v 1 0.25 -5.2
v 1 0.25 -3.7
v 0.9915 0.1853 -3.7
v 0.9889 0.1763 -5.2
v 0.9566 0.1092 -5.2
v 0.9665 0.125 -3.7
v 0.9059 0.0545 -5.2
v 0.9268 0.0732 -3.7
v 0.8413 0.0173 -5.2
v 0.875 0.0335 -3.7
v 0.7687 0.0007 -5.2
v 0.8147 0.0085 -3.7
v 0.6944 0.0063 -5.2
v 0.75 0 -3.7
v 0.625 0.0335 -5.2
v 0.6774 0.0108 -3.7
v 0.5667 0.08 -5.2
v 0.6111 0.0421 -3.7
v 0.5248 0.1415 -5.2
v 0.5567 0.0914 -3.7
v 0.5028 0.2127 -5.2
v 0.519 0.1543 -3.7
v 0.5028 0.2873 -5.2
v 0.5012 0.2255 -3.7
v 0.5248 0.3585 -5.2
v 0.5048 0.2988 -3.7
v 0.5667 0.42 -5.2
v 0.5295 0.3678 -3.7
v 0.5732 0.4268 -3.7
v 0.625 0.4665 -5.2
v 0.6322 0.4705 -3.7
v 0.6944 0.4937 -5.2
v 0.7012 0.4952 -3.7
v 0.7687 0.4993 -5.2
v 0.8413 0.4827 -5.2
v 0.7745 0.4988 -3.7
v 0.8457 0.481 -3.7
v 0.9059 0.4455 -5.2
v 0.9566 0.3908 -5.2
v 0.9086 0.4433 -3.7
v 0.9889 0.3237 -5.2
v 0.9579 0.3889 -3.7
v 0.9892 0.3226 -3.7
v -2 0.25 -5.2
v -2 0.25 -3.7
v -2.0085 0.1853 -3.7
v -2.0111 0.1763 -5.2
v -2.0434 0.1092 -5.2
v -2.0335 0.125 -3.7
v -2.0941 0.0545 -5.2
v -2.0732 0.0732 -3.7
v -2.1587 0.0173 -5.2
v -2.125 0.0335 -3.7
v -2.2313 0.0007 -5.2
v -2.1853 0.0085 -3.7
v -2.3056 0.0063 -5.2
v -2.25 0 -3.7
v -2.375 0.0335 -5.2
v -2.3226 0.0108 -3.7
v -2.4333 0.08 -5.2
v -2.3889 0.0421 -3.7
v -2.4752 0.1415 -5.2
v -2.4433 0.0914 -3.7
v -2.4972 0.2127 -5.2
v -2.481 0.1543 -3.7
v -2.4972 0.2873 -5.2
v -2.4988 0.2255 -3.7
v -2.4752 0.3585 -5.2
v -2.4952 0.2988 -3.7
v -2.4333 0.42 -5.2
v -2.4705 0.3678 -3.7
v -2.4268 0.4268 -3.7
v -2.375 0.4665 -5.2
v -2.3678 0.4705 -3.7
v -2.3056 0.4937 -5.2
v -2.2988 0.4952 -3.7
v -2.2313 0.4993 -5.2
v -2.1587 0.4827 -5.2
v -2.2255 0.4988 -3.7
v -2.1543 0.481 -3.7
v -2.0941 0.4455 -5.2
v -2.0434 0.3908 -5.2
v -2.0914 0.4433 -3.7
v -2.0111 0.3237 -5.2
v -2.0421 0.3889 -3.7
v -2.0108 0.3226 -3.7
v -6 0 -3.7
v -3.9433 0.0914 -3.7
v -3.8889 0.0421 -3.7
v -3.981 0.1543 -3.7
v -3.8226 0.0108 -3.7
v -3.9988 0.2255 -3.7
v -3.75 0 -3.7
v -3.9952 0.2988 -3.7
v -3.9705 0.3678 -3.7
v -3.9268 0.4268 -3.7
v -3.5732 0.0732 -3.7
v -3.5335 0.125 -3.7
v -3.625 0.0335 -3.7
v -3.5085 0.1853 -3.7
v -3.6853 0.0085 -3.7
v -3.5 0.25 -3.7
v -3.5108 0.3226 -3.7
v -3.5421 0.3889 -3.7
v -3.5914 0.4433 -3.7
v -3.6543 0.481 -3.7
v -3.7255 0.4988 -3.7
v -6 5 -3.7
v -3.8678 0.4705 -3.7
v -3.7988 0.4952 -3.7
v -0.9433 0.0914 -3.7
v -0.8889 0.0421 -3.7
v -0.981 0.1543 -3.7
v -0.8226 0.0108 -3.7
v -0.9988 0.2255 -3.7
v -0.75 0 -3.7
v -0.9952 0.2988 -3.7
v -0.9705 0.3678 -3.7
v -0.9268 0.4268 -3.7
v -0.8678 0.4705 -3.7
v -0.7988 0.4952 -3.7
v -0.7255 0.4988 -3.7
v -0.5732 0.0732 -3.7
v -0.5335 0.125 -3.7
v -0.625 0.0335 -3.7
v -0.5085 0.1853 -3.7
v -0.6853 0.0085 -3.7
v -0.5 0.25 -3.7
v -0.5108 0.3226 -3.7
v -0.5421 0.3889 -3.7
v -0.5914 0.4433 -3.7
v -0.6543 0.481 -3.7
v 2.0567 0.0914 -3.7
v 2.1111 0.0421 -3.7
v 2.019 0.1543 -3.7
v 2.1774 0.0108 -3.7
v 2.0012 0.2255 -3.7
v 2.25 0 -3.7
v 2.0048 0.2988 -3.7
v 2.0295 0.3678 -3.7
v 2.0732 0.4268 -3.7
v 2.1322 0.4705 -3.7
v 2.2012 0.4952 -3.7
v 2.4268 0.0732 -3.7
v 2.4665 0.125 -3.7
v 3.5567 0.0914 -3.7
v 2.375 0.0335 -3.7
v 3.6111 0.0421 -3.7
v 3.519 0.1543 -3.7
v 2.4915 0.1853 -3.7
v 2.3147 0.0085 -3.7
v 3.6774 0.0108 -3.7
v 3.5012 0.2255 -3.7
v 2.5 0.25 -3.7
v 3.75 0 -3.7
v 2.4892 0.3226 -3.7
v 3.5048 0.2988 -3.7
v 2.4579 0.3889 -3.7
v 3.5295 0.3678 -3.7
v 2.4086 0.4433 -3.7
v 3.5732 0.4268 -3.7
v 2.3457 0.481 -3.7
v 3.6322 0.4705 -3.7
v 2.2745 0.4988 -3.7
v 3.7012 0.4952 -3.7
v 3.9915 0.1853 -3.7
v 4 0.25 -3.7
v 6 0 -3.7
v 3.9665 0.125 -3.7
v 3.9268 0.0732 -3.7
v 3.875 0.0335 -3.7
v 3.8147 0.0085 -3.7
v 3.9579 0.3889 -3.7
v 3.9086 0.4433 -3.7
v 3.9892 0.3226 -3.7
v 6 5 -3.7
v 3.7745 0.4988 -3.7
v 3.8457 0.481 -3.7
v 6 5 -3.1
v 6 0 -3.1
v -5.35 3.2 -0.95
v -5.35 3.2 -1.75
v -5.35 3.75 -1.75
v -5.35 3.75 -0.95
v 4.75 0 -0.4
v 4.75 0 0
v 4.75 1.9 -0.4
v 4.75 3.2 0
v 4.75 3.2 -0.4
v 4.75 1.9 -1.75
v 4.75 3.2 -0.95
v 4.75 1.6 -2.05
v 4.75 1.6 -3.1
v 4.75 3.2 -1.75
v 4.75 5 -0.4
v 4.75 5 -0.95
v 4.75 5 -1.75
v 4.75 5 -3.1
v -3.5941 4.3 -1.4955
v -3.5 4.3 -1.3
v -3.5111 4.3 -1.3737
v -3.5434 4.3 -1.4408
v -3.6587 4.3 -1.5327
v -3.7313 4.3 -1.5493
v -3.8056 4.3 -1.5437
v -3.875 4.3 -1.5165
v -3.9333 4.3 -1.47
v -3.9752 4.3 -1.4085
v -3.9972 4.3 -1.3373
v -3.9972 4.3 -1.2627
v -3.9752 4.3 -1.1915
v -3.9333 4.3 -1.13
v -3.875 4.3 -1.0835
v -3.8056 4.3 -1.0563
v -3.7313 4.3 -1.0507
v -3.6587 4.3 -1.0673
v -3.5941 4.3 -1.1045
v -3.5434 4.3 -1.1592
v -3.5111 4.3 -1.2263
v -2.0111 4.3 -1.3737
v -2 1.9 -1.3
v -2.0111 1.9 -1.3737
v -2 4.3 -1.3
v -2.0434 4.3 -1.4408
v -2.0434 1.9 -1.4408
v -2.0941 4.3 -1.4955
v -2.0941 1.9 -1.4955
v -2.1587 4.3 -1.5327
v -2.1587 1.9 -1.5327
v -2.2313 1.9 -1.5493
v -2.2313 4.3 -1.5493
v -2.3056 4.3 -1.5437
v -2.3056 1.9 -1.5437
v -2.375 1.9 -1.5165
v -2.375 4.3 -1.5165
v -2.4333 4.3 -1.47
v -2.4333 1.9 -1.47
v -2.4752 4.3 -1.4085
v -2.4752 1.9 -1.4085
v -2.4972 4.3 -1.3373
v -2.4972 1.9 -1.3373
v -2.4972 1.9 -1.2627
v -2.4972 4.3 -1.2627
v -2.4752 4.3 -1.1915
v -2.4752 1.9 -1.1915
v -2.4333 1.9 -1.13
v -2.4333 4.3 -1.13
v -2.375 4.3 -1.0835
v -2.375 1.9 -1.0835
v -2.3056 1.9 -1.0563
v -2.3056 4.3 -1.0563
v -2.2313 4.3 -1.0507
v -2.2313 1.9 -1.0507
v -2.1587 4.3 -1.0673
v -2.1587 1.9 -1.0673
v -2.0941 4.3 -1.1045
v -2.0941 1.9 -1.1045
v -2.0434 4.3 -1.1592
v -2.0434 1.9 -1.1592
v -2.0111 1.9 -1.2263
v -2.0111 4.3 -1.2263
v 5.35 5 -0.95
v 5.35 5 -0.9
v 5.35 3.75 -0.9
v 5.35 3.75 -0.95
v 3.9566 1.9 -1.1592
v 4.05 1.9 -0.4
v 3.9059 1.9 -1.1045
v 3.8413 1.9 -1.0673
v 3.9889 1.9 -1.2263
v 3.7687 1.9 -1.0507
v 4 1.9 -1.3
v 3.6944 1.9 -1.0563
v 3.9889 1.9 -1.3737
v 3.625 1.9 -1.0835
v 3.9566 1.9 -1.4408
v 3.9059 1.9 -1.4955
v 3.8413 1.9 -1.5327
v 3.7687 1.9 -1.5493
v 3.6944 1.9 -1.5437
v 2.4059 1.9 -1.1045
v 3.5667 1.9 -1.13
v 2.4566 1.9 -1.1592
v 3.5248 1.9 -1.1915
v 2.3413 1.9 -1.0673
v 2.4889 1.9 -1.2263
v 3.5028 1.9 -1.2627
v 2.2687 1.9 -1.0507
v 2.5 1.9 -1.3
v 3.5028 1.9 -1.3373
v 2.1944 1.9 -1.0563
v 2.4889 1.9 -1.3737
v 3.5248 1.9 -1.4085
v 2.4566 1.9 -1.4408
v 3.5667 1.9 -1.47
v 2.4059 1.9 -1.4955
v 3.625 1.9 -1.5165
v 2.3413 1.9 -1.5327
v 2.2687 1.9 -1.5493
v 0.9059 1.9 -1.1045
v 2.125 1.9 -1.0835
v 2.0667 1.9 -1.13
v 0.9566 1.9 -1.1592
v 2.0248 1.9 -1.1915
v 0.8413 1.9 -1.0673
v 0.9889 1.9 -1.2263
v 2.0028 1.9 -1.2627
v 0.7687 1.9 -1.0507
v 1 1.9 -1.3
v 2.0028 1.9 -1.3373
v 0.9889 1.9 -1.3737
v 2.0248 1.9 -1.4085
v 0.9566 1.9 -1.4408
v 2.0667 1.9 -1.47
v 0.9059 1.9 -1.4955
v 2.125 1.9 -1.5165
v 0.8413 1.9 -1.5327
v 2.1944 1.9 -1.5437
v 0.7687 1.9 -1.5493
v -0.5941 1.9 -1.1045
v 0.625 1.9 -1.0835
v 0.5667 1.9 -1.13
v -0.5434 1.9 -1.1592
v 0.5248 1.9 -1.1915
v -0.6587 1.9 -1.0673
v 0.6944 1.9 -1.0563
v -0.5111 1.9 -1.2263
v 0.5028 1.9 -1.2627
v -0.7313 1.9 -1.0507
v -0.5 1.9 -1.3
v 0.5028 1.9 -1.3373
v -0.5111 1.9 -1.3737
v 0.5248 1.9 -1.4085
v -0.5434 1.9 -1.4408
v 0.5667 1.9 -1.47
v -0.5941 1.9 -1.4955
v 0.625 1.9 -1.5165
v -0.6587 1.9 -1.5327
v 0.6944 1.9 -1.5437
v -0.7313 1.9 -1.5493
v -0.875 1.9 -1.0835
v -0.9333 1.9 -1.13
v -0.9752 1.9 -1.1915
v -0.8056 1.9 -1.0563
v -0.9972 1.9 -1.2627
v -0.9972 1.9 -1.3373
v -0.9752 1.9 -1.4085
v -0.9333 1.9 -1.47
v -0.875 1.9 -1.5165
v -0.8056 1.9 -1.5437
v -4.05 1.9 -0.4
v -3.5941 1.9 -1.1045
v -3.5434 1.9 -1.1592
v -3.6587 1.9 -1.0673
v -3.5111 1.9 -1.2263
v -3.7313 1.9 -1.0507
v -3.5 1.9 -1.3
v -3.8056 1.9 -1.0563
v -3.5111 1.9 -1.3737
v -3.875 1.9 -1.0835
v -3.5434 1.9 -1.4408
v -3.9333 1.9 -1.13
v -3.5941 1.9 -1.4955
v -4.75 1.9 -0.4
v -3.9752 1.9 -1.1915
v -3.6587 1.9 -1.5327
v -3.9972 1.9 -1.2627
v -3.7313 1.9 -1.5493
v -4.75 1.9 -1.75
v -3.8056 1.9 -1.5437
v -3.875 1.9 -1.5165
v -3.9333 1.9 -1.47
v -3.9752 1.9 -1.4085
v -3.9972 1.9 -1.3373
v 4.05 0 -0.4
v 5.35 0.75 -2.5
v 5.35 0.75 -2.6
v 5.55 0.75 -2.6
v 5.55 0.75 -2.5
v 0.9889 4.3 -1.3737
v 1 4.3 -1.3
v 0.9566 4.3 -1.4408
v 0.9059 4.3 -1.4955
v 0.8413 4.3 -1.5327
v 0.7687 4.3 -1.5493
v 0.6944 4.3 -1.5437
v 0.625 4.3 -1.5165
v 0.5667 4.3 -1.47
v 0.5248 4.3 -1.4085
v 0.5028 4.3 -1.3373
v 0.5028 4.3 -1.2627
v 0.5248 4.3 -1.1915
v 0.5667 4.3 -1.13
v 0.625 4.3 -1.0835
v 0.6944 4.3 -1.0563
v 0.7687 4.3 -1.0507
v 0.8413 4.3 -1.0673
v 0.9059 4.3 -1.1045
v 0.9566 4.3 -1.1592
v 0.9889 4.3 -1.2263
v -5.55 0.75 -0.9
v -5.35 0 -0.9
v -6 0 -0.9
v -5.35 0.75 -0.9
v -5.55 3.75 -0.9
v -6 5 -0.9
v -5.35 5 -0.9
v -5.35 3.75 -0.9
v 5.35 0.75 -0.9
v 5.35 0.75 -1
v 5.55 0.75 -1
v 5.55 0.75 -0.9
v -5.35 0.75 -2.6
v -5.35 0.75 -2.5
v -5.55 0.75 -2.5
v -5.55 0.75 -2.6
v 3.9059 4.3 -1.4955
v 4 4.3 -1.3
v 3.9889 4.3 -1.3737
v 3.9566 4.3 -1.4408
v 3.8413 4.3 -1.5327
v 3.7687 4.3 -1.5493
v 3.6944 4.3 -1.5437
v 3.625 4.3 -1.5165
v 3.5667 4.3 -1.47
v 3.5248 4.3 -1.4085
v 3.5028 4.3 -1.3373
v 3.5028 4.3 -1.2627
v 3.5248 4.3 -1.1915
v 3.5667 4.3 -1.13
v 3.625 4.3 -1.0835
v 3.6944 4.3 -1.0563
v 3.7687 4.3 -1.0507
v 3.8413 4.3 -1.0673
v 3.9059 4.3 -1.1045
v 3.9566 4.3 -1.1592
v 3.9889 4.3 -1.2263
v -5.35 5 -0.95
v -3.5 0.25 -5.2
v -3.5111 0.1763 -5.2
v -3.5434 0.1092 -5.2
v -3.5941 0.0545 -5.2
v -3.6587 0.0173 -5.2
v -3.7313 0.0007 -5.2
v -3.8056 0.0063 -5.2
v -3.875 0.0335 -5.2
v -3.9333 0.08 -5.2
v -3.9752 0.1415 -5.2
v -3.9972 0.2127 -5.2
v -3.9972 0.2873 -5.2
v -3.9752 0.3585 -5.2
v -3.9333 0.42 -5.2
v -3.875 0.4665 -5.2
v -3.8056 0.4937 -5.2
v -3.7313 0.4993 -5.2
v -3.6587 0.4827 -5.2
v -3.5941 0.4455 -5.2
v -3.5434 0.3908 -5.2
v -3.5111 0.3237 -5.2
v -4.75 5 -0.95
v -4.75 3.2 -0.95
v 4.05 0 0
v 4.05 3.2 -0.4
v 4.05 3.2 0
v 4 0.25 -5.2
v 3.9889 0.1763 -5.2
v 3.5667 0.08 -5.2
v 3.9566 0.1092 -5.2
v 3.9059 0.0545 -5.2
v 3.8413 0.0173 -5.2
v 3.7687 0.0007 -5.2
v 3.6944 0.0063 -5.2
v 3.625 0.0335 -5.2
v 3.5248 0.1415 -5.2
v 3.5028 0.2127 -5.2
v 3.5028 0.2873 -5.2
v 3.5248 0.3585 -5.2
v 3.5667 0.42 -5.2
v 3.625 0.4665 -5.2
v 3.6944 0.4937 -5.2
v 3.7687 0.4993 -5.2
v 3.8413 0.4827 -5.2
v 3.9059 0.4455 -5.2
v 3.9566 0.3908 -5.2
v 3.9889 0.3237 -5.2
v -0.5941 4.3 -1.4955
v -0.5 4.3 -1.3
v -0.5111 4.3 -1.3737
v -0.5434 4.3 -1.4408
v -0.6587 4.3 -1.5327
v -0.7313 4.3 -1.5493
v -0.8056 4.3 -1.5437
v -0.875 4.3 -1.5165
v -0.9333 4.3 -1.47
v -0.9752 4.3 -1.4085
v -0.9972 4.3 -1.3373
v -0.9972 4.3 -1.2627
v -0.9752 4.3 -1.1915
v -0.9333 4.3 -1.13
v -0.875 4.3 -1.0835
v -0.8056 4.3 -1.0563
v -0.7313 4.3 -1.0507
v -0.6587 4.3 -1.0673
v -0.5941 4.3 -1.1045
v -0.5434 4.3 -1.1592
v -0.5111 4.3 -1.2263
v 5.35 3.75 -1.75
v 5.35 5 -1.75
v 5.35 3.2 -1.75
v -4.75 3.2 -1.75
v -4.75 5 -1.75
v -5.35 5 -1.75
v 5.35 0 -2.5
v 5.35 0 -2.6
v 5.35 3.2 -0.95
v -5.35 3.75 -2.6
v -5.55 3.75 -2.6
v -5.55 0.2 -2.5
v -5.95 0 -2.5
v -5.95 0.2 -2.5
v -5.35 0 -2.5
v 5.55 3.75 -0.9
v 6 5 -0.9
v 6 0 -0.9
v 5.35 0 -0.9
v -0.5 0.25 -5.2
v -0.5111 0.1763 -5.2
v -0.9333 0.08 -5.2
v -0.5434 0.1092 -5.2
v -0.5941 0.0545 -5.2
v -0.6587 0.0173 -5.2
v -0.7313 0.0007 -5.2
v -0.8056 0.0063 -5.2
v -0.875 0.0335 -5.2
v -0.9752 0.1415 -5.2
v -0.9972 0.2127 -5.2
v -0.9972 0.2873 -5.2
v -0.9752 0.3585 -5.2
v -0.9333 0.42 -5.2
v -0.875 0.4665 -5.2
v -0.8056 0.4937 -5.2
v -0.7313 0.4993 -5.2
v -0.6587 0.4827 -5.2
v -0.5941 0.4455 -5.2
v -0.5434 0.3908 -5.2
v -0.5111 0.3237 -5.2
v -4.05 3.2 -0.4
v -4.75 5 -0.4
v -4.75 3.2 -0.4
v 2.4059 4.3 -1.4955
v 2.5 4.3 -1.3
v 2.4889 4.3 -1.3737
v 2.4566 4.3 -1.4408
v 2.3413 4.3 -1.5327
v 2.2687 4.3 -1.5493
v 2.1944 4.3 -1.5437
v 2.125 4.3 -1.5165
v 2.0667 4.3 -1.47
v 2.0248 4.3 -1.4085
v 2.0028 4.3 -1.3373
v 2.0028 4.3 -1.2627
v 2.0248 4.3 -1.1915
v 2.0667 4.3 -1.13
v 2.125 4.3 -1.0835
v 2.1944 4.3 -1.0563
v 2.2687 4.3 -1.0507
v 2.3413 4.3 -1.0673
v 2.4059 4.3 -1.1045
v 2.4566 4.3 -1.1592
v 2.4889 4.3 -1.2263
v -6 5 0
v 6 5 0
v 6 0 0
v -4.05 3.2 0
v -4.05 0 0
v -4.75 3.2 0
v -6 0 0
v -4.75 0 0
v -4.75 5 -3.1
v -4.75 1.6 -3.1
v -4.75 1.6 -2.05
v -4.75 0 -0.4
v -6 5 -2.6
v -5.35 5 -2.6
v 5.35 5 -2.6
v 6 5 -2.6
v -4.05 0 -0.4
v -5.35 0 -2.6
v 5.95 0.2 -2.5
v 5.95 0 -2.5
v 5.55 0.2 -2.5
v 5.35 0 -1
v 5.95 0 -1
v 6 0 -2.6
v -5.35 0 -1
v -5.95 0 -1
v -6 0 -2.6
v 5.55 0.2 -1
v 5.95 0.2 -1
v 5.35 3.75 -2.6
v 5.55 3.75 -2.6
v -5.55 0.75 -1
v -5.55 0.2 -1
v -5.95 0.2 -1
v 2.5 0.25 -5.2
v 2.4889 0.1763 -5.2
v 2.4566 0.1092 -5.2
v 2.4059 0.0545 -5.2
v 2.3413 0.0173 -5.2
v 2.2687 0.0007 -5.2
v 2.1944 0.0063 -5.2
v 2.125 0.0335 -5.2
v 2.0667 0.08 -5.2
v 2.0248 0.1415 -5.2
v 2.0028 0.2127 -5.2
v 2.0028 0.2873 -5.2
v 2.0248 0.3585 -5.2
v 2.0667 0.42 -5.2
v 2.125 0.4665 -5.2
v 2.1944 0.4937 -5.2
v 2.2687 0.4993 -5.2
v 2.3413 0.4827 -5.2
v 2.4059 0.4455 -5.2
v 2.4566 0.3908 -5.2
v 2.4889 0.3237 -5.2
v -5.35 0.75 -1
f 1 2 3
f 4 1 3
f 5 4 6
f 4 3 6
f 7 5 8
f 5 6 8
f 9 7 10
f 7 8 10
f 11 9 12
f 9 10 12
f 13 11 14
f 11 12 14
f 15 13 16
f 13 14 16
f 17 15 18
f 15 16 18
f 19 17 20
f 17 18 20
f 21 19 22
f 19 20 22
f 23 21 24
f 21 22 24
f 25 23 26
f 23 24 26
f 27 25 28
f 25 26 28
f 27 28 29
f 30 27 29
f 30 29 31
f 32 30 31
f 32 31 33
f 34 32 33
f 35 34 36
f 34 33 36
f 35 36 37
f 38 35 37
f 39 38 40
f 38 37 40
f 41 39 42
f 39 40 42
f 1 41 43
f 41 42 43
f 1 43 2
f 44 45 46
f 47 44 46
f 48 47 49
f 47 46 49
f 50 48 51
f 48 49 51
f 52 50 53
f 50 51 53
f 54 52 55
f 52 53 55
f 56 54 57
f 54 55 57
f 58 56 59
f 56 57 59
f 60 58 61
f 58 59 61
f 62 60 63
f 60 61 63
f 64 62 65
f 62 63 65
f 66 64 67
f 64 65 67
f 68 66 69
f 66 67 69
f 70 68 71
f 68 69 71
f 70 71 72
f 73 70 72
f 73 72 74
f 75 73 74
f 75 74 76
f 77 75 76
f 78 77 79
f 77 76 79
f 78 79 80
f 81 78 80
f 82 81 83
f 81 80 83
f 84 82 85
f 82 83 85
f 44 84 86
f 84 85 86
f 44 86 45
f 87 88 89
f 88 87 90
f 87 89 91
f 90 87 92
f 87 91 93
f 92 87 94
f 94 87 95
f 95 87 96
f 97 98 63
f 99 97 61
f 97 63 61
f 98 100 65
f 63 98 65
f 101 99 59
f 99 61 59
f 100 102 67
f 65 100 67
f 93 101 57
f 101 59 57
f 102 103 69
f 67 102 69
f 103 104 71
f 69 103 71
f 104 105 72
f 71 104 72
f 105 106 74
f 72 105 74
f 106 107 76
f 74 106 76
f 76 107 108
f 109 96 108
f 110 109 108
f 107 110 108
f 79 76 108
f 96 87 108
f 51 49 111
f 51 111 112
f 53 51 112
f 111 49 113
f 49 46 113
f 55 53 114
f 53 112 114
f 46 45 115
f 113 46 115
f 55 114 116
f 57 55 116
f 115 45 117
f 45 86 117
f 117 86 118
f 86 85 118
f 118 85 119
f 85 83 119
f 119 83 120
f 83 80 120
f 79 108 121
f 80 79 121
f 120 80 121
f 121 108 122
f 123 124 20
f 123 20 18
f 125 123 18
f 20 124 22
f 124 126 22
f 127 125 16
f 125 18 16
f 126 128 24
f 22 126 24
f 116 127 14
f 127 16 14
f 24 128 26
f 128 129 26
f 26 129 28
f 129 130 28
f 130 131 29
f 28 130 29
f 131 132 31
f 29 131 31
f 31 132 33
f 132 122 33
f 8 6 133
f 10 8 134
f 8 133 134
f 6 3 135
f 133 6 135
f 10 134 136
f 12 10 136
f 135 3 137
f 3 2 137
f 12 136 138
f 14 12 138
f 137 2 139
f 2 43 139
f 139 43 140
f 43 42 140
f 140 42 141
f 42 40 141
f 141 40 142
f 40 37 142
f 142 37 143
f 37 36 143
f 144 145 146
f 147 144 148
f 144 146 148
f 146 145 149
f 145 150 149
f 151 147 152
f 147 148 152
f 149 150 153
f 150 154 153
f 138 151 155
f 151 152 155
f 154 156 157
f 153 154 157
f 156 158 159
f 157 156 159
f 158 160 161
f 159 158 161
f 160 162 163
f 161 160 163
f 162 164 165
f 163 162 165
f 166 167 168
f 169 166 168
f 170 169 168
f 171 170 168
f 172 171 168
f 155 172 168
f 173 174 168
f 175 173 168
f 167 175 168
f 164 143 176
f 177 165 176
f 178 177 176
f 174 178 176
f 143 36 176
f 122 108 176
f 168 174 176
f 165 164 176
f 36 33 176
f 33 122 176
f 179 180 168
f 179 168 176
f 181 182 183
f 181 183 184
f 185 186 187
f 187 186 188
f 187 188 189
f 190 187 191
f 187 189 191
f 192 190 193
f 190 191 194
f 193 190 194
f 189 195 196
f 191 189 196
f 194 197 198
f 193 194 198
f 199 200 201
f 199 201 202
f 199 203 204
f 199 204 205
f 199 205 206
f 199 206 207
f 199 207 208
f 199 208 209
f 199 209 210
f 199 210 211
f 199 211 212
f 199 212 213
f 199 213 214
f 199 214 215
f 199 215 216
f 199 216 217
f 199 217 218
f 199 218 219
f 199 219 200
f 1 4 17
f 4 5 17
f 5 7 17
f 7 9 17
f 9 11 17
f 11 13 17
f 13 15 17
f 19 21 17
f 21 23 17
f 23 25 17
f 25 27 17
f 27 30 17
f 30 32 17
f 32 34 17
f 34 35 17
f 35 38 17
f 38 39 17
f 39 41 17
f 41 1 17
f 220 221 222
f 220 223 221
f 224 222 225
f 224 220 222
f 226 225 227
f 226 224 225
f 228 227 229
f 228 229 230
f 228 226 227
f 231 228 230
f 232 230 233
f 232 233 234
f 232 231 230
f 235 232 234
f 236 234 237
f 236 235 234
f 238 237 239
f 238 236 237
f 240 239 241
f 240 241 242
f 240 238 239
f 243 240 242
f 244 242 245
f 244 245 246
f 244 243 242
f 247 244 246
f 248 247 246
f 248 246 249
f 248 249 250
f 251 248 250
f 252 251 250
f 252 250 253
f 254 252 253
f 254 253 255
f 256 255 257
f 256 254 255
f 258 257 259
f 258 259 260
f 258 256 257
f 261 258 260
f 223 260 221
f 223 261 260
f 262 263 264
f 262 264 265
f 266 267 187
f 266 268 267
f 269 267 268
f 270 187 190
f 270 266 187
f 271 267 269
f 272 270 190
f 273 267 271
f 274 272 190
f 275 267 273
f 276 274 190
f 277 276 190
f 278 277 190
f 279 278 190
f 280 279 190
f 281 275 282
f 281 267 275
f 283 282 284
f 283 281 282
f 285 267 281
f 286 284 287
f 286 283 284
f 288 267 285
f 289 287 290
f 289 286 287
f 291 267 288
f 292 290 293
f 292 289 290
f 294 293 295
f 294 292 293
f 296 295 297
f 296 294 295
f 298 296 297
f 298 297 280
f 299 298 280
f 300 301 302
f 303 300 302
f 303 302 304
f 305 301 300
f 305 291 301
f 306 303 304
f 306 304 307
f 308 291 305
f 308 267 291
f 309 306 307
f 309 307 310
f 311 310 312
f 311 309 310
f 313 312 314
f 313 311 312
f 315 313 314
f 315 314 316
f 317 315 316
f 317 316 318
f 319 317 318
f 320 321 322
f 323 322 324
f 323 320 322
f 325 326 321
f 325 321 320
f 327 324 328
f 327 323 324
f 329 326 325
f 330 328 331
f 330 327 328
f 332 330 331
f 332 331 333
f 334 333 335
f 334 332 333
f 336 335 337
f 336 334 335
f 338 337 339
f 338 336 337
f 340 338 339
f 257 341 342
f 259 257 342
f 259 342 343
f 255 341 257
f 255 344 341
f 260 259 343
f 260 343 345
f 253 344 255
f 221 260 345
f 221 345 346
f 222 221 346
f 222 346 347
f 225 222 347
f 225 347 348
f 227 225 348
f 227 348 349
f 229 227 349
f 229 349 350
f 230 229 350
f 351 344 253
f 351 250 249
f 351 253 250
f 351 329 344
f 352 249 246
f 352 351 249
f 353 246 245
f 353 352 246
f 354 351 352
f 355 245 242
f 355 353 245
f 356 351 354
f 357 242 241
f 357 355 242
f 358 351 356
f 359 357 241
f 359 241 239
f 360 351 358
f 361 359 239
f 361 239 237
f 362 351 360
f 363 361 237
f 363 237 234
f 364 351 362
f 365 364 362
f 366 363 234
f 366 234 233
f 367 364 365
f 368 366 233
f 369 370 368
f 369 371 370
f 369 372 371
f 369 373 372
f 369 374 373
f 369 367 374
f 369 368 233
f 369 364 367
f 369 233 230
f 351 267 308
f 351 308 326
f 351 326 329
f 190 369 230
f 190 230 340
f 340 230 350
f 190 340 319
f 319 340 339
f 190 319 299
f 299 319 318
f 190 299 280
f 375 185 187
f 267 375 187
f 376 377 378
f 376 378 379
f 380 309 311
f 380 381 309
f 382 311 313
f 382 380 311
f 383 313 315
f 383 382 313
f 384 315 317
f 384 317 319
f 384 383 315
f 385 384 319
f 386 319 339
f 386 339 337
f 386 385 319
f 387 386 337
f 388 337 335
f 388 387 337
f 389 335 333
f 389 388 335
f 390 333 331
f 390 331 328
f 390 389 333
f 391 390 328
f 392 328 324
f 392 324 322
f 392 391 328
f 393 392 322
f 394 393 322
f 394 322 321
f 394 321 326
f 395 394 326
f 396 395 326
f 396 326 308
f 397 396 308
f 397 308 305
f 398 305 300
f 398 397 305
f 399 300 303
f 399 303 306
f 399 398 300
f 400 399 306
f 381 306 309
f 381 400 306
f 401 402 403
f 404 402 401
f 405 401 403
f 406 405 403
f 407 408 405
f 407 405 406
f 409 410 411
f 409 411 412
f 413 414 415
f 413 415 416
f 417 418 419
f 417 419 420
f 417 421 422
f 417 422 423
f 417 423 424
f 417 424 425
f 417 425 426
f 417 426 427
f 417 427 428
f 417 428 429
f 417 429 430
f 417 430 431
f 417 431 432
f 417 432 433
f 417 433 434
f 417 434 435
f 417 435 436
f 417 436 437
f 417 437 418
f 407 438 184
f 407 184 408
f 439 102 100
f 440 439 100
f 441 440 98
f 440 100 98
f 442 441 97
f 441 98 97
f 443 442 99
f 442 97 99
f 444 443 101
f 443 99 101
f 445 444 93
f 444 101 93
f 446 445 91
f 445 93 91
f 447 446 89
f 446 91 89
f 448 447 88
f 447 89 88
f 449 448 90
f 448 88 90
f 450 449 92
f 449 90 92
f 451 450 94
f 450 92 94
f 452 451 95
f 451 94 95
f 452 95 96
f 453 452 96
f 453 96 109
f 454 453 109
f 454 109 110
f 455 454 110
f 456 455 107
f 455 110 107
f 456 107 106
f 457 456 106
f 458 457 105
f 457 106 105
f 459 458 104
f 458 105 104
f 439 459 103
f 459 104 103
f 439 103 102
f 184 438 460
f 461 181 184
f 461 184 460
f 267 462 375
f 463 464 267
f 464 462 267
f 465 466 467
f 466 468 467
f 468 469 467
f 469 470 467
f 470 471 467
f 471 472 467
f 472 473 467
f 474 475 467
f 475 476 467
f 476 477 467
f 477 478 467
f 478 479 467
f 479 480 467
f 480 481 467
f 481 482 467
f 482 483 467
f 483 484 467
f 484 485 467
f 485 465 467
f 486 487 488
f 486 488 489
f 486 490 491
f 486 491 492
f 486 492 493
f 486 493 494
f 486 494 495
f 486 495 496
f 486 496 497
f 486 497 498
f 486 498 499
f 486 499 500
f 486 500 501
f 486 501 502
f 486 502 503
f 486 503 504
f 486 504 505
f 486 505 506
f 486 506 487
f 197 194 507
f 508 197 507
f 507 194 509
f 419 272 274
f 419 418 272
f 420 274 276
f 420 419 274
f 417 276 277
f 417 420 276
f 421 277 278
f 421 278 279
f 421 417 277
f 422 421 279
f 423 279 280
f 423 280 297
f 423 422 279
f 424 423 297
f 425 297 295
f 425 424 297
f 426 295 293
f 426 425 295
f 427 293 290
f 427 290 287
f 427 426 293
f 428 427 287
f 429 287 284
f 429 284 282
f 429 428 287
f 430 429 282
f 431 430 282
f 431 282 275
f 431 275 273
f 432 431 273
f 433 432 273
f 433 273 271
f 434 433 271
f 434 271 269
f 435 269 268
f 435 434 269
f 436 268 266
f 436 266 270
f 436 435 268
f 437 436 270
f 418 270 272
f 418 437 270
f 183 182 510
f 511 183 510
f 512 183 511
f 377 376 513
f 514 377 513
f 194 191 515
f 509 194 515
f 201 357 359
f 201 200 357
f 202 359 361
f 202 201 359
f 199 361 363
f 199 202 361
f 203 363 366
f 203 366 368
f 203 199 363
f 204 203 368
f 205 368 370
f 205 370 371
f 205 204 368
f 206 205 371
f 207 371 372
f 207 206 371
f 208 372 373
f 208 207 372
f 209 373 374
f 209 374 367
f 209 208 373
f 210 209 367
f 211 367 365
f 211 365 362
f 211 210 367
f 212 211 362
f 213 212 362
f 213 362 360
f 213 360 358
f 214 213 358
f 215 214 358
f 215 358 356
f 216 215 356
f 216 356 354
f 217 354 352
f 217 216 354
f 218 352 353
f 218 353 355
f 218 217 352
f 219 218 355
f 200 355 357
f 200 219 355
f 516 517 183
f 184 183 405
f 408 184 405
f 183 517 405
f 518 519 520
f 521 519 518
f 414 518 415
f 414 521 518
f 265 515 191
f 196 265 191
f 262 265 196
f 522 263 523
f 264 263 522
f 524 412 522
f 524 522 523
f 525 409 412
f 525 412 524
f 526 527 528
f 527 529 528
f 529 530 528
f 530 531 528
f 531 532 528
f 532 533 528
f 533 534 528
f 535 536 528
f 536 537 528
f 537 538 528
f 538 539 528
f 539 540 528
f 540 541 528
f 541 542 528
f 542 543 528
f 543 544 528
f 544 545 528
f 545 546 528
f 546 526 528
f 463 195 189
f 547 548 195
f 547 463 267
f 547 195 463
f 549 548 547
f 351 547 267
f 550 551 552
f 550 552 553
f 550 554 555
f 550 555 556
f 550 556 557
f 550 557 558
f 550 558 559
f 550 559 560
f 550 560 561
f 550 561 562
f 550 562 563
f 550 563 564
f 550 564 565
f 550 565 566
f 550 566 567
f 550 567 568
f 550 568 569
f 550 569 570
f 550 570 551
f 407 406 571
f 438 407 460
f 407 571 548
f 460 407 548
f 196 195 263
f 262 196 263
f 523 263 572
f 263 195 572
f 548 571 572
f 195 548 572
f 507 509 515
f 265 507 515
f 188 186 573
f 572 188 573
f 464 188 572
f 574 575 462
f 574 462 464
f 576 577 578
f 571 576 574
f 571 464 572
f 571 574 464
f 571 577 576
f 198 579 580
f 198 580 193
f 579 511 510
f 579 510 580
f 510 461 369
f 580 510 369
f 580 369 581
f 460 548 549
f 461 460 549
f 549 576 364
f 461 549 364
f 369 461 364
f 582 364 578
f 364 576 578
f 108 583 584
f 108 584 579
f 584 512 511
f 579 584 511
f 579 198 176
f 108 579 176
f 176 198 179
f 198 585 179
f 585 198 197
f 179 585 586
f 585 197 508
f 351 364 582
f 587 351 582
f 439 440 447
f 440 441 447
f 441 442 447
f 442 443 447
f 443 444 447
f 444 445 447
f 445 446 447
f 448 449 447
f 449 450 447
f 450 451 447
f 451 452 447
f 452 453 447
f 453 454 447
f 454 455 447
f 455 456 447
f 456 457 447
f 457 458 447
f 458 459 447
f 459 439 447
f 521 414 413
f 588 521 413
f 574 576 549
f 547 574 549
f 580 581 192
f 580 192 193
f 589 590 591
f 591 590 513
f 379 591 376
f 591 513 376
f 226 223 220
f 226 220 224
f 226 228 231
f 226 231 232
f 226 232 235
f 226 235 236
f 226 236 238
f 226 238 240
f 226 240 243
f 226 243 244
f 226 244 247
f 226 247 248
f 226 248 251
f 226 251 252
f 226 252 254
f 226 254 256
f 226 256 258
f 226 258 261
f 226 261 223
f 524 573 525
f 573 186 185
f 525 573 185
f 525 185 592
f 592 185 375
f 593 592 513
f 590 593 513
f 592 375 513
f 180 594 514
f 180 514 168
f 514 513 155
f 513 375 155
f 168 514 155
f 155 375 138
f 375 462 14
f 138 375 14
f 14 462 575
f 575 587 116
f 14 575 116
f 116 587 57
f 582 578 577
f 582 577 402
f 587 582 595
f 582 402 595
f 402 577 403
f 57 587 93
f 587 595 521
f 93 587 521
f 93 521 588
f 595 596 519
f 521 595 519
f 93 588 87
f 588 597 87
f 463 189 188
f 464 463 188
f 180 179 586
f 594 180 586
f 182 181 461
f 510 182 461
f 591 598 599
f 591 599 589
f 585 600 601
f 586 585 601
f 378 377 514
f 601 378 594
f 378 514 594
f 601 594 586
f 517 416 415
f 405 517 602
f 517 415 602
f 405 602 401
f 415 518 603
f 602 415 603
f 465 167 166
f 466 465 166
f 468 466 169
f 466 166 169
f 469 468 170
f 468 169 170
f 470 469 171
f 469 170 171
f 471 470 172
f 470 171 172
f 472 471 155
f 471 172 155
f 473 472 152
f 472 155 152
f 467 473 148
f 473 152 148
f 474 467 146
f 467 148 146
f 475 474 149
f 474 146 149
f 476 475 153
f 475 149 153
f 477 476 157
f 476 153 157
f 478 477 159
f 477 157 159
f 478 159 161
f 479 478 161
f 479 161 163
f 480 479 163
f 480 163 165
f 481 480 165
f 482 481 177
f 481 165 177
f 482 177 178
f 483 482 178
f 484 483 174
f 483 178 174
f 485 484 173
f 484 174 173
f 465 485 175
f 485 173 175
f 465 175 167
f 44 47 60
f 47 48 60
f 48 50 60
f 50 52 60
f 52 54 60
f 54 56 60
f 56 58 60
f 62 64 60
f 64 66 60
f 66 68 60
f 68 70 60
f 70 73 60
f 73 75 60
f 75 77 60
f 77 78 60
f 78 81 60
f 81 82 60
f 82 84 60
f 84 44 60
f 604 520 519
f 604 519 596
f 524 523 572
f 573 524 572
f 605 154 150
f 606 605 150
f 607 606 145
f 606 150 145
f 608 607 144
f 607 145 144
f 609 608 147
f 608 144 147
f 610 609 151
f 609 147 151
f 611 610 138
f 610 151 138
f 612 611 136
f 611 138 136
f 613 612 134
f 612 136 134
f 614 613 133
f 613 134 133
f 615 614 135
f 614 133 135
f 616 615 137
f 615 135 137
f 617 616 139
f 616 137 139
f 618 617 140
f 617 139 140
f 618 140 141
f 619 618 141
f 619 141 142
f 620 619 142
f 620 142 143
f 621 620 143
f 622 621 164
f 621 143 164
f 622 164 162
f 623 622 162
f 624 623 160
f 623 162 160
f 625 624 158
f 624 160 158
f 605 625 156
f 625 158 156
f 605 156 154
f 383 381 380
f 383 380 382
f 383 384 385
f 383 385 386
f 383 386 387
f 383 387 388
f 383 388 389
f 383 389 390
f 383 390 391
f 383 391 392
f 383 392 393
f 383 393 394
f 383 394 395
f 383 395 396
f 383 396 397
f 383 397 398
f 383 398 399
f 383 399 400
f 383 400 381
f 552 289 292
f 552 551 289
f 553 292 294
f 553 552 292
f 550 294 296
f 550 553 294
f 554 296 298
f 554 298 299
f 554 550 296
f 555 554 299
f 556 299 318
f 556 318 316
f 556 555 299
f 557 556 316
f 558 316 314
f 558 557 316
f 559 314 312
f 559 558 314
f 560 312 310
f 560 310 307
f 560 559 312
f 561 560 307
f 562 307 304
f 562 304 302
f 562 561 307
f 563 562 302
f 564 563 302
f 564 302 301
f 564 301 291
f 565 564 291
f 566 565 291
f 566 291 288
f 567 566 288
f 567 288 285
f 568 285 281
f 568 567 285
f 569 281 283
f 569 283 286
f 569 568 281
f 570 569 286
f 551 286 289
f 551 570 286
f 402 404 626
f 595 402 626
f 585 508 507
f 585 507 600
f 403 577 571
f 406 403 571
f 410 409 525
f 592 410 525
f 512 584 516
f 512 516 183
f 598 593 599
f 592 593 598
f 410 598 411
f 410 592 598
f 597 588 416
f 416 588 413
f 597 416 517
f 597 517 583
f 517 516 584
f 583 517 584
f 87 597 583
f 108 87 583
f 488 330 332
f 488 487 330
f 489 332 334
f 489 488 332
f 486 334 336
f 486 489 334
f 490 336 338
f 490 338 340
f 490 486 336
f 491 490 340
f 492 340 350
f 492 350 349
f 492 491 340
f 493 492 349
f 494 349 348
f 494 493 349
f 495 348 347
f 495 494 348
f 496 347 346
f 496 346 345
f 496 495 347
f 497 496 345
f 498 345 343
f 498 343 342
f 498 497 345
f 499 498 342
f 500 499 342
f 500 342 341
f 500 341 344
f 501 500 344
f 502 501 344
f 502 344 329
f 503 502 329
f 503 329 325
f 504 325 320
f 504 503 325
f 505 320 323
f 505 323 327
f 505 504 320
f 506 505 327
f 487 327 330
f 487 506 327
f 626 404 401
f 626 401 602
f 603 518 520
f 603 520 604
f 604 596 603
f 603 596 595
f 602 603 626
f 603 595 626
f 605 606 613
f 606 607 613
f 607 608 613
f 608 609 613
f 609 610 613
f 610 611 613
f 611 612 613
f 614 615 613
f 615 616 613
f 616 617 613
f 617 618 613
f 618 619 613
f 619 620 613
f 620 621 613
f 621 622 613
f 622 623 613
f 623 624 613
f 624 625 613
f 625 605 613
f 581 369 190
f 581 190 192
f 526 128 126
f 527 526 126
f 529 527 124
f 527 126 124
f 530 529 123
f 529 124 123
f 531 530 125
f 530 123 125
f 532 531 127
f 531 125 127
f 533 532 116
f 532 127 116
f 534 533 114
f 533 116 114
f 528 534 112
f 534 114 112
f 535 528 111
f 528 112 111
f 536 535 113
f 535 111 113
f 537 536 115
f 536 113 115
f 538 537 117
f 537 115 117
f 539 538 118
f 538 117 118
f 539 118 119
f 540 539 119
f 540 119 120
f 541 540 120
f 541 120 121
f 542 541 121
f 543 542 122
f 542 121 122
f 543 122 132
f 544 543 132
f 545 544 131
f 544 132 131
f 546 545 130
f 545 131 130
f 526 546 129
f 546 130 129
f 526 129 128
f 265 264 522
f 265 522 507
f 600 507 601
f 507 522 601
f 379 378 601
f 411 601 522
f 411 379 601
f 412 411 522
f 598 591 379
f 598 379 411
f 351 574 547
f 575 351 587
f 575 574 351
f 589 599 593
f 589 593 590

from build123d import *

# Parameters (mm, degrees)
SKETCH1_W           = 1.25
SKETCH1_H           = 5
BOSS_EXTRUDE1_DEPTH = 3.1
BOSS_EXTRUDE2_DEPTH = 9.5
BOSS_EXTRUDE3_DEPTH = 1.250000167
CUT_EXTRUDE1_DEPTH  = 0.7
CUT_EXTRUDE2_DEPTH  = 0.7
BOSS_EXTRUDE4_DEPTH = 0.6
SKETCH7_W           = 0.45
SKETCH7_H           = 1.7
CUT_EXTRUDE3_DEPTH  = 6.0000001
CUT_EXTRUDE4_REACH  = 13.55
SKETCH8_W           = 0.8
SKETCH8_H           = 1.25
SKETCH9_W           = 0.85
SKETCH9_H           = 1.25
CUT_EXTRUDE5_DEPTH  = 0.2
SKETCH10_W          = 0.05
SKETCH10_H          = 1.25
CUT_EXTRUDE6_DEPTH  = 0.2
CUT_EXTRUDE7_REACH  = 3.8
SKETCH12_W          = 0.6
SKETCH12_H          = 0.8
SKETCH13_W          = 0.45
SKETCH13_H          = 1.7
CUT_EXTRUDE8_DEPTH  = 6.0000001
SKETCH14_W          = 0.8
SKETCH14_H          = 1.25
CUT_EXTRUDE9_DEPTH  = 12.5500001
SKETCH15_W          = 0.85
SKETCH15_H          = 1.25
CUT_EXTRUDE10_DEPTH = 0.2
CUT_EXTRUDE11_REACH = 2.65
SKETCH17_W          = 0.1
SKETCH17_H          = 0.75
SKETCH18_W          = 1.5
SKETCH18_H          = 0.2
BOSS_EXTRUDE5_DEPTH = 0.4
CUT_EXTRUDE12_REACH = 2.65
SKETCH20_W          = 0.1
SKETCH20_H          = 0.75
CUT_EXTRUDE13_REACH = 2.65
SKETCH22_W          = 0.75
SKETCH22_H          = 0.1
SKETCH23_W          = 1.5
SKETCH23_H          = 0.2
BOSS_EXTRUDE6_DEPTH = 0.4
CUT_EXTRUDE14_REACH = 2.65
SKETCH25_W          = 0.75
SKETCH25_H          = 0.1
SKETCH26_W          = 0.05
SKETCH26_H          = 1.25
CUT_EXTRUDE15_DEPTH = 0.2
CUT_EXTRUDE16_REACH = 3.8
SKETCH28_W          = 0.6
SKETCH28_H          = 0.8
SKETCH29_W          = 0.25
SKETCH29_H          = 2.4
SKETCH30_W          = 0.25
SKETCH30_H          = 2.4
SKETCH31_W          = 0.25
SKETCH31_H          = 2.4
SKETCH32_W          = 0.25
SKETCH32_H          = 2.4
SKETCH33_W          = 0.25
SKETCH33_H          = 2.4
SKETCH34_W          = 0.25
SKETCH34_H          = 2.4
SKETCH35_W          = 0.25
SKETCH35_H          = 1.5
SKETCH36_W          = 0.25
SKETCH36_H          = 1.5
SKETCH37_W          = 0.25
SKETCH37_H          = 1.5
SKETCH38_W          = 0.25
SKETCH38_H          = 1.5
SKETCH39_W          = 0.25
SKETCH39_H          = 1.5
SKETCH40_W          = 0.25
SKETCH40_H          = 1.5


with BuildPart() as part:
    # Sketch1 → Boss-Extrude1 (new body)
    with BuildSketch(Plane.XY):
        with Locations((-5.375, 2.5)):
            Rectangle(SKETCH1_W, SKETCH1_H)
    extrude(amount=-BOSS_EXTRUDE1_DEPTH)

    # Sketch2 → Boss-Extrude2 (add)
    with BuildSketch(Plane(origin=(-4.75, 0, 0), x_dir=(0, 0, -1), z_dir=(1, 0, 0))):
        with BuildLine():
            Line((0, 5), (0.4, 5))
            Line((0.4, 5), (0.4, 1.9))
            Line((0.4, 1.9), (1.75, 1.9))
            Line((1.75, 1.9), (2.05, 1.6))
            Line((2.05, 1.6), (3.1, 1.6))
            add(Edge.make_bspline(
                [(3.1, 0), (3.1, 1.6)],
                knots=[0, 0, 0.32, 0.32], degree=1))
            Line((3.1, 0), (0, 0))
            Line((0, 0), (0, 5))
        make_face()
    extrude(amount=BOSS_EXTRUDE2_DEPTH)

    # Sketch3 → Boss-Extrude3 (add)
    with BuildSketch(Plane(origin=(4.75, 0, 0), x_dir=(0, 0, -1), z_dir=(1, 0, 0))):
        with BuildLine():
            Line((3.1, 0), (0, 0))
            Line((0, 0), (0, 5))
            Line((0, 5), (3.1, 5))
            add(Edge.make_bspline(
                [(3.1, 0), (3.1, 5)],
                knots=[0, 0, 1, 1], degree=1))
        make_face()
    extrude(amount=BOSS_EXTRUDE3_DEPTH)

    # Sketch4 → Cut-Extrude1 (cut)
    with BuildSketch(Plane(origin=(4.75, 0, 0), x_dir=(0, 0, -1), z_dir=(1, 0, 0))):
        Polygon((0.4, 1.9), (0.4, 3.2), (0, 3.2), (0, 0), (0.4, 0), align=None)
    extrude(amount=-CUT_EXTRUDE1_DEPTH, mode=Mode.SUBTRACT)

    # Sketch5 → Cut-Extrude2 (cut)
    with BuildSketch(Plane(origin=(-4.75, 0, 0), x_dir=(0, -1, 0), z_dir=(-1, 0, 0))):
        Polygon((-1.9, -0.4), (0, -0.4), (0, 0), (-3.2, 0), (-3.2, -0.4), align=None)
    extrude(amount=-CUT_EXTRUDE2_DEPTH, mode=Mode.SUBTRACT)

    # Sketch6 → Boss-Extrude4 (add)
    with BuildSketch(Plane(origin=(0, 0, -3.1), x_dir=(-1, 0, 0), z_dir=(0, 0, -1))):
        with BuildLine():
            add(Edge.make_bspline(
                [(6, 0), (-6, 0)],
                knots=[0, 0, 1, 1], degree=1))
            add(Edge.make_bspline(
                [(-6, 0), (-6, 5)],
                knots=[0, 0, 1, 1], degree=1))
            add(Edge.make_bspline(
                [(6, 5), (-6, 5)],
                knots=[0, 0, 1, 1], degree=1))
            add(Edge.make_bspline(
                [(6, 0), (6, 5)],
                knots=[0, 0, 1, 1], degree=1))
        make_face()
    extrude(amount=BOSS_EXTRUDE4_DEPTH)

    # Sketch7 → Cut-Extrude3 (cut, through all)
    with BuildSketch(Plane.XZ):
        with Locations((-5.775, -1.75)):
            Rectangle(SKETCH7_W, SKETCH7_H)
    extrude(amount=-CUT_EXTRUDE3_DEPTH, mode=Mode.SUBTRACT)

    # Sketch8 → Cut-Extrude4 (cut, up to next)
    with BuildSketch(Plane.ZY.offset(5.55), mode=Mode.PRIVATE) as cut_extrude4_sk1:
        with Locations((-1.35, 4.375)):
            Rectangle(SKETCH8_W, SKETCH8_H)
    cut_extrude4_tool1 = extrude(cut_extrude4_sk1.sketch, amount=-CUT_EXTRUDE4_REACH, mode=Mode.PRIVATE) & part.part
    add(cut_extrude4_tool1.solids().sort_by_distance((-5.55, 4.375, -1.35))[0], mode=Mode.SUBTRACT)

    # Sketch9 → Cut-Extrude5 (cut)
    with BuildSketch(Plane.ZY.offset(5.55)):
        with Locations((-2.175, 4.375)):
            Rectangle(SKETCH9_W, SKETCH9_H)
    extrude(amount=-CUT_EXTRUDE5_DEPTH, mode=Mode.SUBTRACT)

    # Sketch10 → Cut-Extrude6 (cut)
    with BuildSketch(Plane.ZY.offset(5.55)):
        with Locations((-0.925, 4.375)):
            Rectangle(SKETCH10_W, SKETCH10_H)
    extrude(amount=-CUT_EXTRUDE6_DEPTH, mode=Mode.SUBTRACT)

    # Sketch12 → Cut-Extrude7 (cut, up to next)
    with BuildSketch(Plane.XZ.offset(-3.2), mode=Mode.PRIVATE) as cut_extrude7_sk1:
        with Locations((-5.05, -1.35)):
            Rectangle(SKETCH12_W, SKETCH12_H)
    cut_extrude7_tool1 = extrude(cut_extrude7_sk1.sketch, amount=-CUT_EXTRUDE7_REACH, mode=Mode.PRIVATE) & part.part
    add(cut_extrude7_tool1.solids().sort_by_distance((-5.05, 3.2, -1.35))[0], mode=Mode.SUBTRACT)

    # Sketch13 → Cut-Extrude8 (cut, through all)
    with BuildSketch(Plane.XZ):
        with Locations((5.775, -1.75)):
            Rectangle(SKETCH13_W, SKETCH13_H)
    extrude(amount=-CUT_EXTRUDE8_DEPTH, mode=Mode.SUBTRACT)

    # Sketch14 → Cut-Extrude9 (cut, through all)
    with BuildSketch(Plane(origin=(5.55, 0, 0), x_dir=(0, 0, -1), z_dir=(1, 0, 0))):
        with Locations((1.35, 4.375)):
            Rectangle(SKETCH14_W, SKETCH14_H)
    extrude(amount=-CUT_EXTRUDE9_DEPTH, mode=Mode.SUBTRACT)

    # Sketch15 → Cut-Extrude10 (cut)
    with BuildSketch(Plane(origin=(5.55, 0, 0), x_dir=(0, 0, -1), z_dir=(1, 0, 0))):
        with Locations((2.175, 4.375)):
            Rectangle(SKETCH15_W, SKETCH15_H)
    extrude(amount=-CUT_EXTRUDE10_DEPTH, mode=Mode.SUBTRACT)

    # Sketch17 → Cut-Extrude11 (cut, up to next)
    with BuildSketch(Plane(origin=(-5.35, 0, 0), x_dir=(0, 0, -1), z_dir=(1, 0, 0)), mode=Mode.PRIVATE) as cut_extrude11_sk1:
        with Locations((0.95, 0.375)):
            Rectangle(SKETCH17_W, SKETCH17_H)
    cut_extrude11_tool1 = extrude(cut_extrude11_sk1.sketch, amount=-CUT_EXTRUDE11_REACH, mode=Mode.PRIVATE) & part.part
    add(cut_extrude11_tool1.solids().sort_by_distance((-5.35, 0.375, -0.95))[0], mode=Mode.SUBTRACT)

    # Sketch18 → Boss-Extrude5 (add)
    with BuildSketch(Plane.ZY.offset(5.55)):
        with Locations((-1.75, 0.1)):
            Rectangle(SKETCH18_W, SKETCH18_H)
    extrude(amount=BOSS_EXTRUDE5_DEPTH)

    # Sketch20 → Cut-Extrude12 (cut, up to next)
    with BuildSketch(Plane(origin=(-5.35, 0, 0), x_dir=(0, 0, -1), z_dir=(1, 0, 0)), mode=Mode.PRIVATE) as cut_extrude12_sk1:
        with Locations((2.55, 0.375)):
            Rectangle(SKETCH20_W, SKETCH20_H)
    cut_extrude12_tool1 = extrude(cut_extrude12_sk1.sketch, amount=-CUT_EXTRUDE12_REACH, mode=Mode.PRIVATE) & part.part
    add(cut_extrude12_tool1.solids().sort_by_distance((-5.35, 0.375, -2.55))[0], mode=Mode.SUBTRACT)

    # Sketch22 → Cut-Extrude13 (cut, up to next)
    with BuildSketch(Plane(origin=(5.35, 0, 0), x_dir=(0, -1, 0), z_dir=(-1, 0, 0)), mode=Mode.PRIVATE) as cut_extrude13_sk1:
        with Locations((-0.375, -2.55)):
            Rectangle(SKETCH22_W, SKETCH22_H)
    cut_extrude13_tool1 = extrude(cut_extrude13_sk1.sketch, amount=-CUT_EXTRUDE13_REACH, mode=Mode.PRIVATE) & part.part
    add(cut_extrude13_tool1.solids().sort_by_distance((5.35, 0.375, -2.55))[0], mode=Mode.SUBTRACT)

    # Sketch23 → Boss-Extrude6 (add)
    with BuildSketch(Plane(origin=(5.55, 0, 0), x_dir=(0, 0, -1), z_dir=(1, 0, 0))):
        with Locations((1.75, 0.1)):
            Rectangle(SKETCH23_W, SKETCH23_H)
    extrude(amount=BOSS_EXTRUDE6_DEPTH)

    # Sketch25 → Cut-Extrude14 (cut, up to next)
    with BuildSketch(Plane(origin=(5.35, 0, 0), x_dir=(0, -1, 0), z_dir=(-1, 0, 0)), mode=Mode.PRIVATE) as cut_extrude14_sk1:
        with Locations((-0.375, -0.95)):
            Rectangle(SKETCH25_W, SKETCH25_H)
    cut_extrude14_tool1 = extrude(cut_extrude14_sk1.sketch, amount=-CUT_EXTRUDE14_REACH, mode=Mode.PRIVATE) & part.part
    add(cut_extrude14_tool1.solids().sort_by_distance((5.35, 0.375, -0.95))[0], mode=Mode.SUBTRACT)

    # Sketch26 → Cut-Extrude15 (cut)
    with BuildSketch(Plane(origin=(5.55, 0, 0), x_dir=(0, 0, -1), z_dir=(1, 0, 0))):
        with Locations((0.925, 4.375)):
            Rectangle(SKETCH26_W, SKETCH26_H)
    extrude(amount=-CUT_EXTRUDE15_DEPTH, mode=Mode.SUBTRACT)

    # Sketch28 → Cut-Extrude16 (cut, up to next)
    with BuildSketch(Plane.XZ.offset(-3.2), mode=Mode.PRIVATE) as cut_extrude16_sk1:
        with Locations((5.05, -1.35)):
            Rectangle(SKETCH28_W, SKETCH28_H)
    cut_extrude16_tool1 = extrude(cut_extrude16_sk1.sketch, amount=-CUT_EXTRUDE16_REACH, mode=Mode.PRIVATE) & part.part
    add(cut_extrude16_tool1.solids().sort_by_distance((5.05, 3.2, -1.35))[0], mode=Mode.SUBTRACT)

    # Sketch29 → Revolve1 (revolve)
    with BuildSketch(Plane(origin=(0, 0, -1.3), x_dir=(-1, 0, 0), z_dir=(0, 0, -1))):
        with Locations((-3.875, 3.1)):
            Rectangle(SKETCH29_W, SKETCH29_H)
    revolve(axis=Axis((3.75, 1.9, -1.3), (0, 1, 0)))

    # Sketch30 → Revolve2 (revolve)
    with BuildSketch(Plane(origin=(0, 0, -1.3), x_dir=(-1, 0, 0), z_dir=(0, 0, -1))):
        with Locations((-2.375, 3.1)):
            Rectangle(SKETCH30_W, SKETCH30_H)
    revolve(axis=Axis((2.25, 1.9, -1.3), (0, 1, 0)))

    # Sketch31 → Revolve3 (revolve)
    with BuildSketch(Plane(origin=(0, 0, -1.3), x_dir=(-1, 0, 0), z_dir=(0, 0, -1))):
        with Locations((-0.875, 3.1)):
            Rectangle(SKETCH31_W, SKETCH31_H)
    revolve(axis=Axis((0.75, 1.9, -1.3), (0, 1, 0)))

    # Sketch32 → Revolve4 (revolve)
    with BuildSketch(Plane(origin=(0, 0, -1.3), x_dir=(-1, 0, 0), z_dir=(0, 0, -1))):
        with Locations((0.625, 3.1)):
            Rectangle(SKETCH32_W, SKETCH32_H)
    revolve(axis=Axis((-0.75, 1.9, -1.3), (0, 1, 0)))

    # Sketch33 → Revolve5 (revolve)
    with BuildSketch(Plane(origin=(0, 0, -1.3), x_dir=(-1, 0, 0), z_dir=(0, 0, -1))):
        with Locations((2.125, 3.1)):
            Rectangle(SKETCH33_W, SKETCH33_H)
    revolve(axis=Axis((-2.25, 1.9, -1.3), (0, 1, 0)))

    # Sketch34 → Revolve6 (revolve)
    with BuildSketch(Plane(origin=(0, 0, -1.3), x_dir=(-1, 0, 0), z_dir=(0, 0, -1))):
        with Locations((3.625, 3.1)):
            Rectangle(SKETCH34_W, SKETCH34_H)
    revolve(axis=Axis((-3.75, 1.9, -1.3), (0, 1, 0)))

    # Sketch35 → Revolve7 (revolve)
    with BuildSketch(Plane.XZ.offset(-0.25)):
        with Locations((3.875, -4.45)):
            Rectangle(SKETCH35_W, SKETCH35_H)
    revolve(axis=Axis((3.75, 0.25, -3.7), (0, 0, -1)))

    # Sketch36 → Revolve8 (revolve)
    with BuildSketch(Plane.XZ.offset(-0.25)):
        with Locations((2.375, -4.45)):
            Rectangle(SKETCH36_W, SKETCH36_H)
    revolve(axis=Axis((2.25, 0.25, -3.7), (0, 0, -1)))

    # Sketch37 → Revolve9 (revolve)
    with BuildSketch(Plane.XZ.offset(-0.25)):
        with Locations((0.875, -4.45)):
            Rectangle(SKETCH37_W, SKETCH37_H)
    revolve(axis=Axis((0.75, 0.25, -3.7), (0, 0, -1)))

    # Sketch38 → Revolve10 (revolve)
    with BuildSketch(Plane.XZ.offset(-0.25)):
        with Locations((-0.625, -4.45)):
            Rectangle(SKETCH38_W, SKETCH38_H)
    revolve(axis=Axis((-0.75, 0.25, -3.7), (0, 0, -1)))

    # Sketch39 → Revolve11 (revolve)
    with BuildSketch(Plane.XZ.offset(-0.25)):
        with Locations((-2.125, -4.45)):
            Rectangle(SKETCH39_W, SKETCH39_H)
    revolve(axis=Axis((-2.25, 0.25, -3.7), (0, 0, -1)))

    # Sketch40 → Revolve12 (revolve)
    with BuildSketch(Plane.XZ.offset(-0.25)):
        with Locations((-3.625, -4.45)):
            Rectangle(SKETCH40_W, SKETCH40_H)
    revolve(axis=Axis((-3.75, 0.25, -3.7), (0, 0, -1)))


solid = part.part
